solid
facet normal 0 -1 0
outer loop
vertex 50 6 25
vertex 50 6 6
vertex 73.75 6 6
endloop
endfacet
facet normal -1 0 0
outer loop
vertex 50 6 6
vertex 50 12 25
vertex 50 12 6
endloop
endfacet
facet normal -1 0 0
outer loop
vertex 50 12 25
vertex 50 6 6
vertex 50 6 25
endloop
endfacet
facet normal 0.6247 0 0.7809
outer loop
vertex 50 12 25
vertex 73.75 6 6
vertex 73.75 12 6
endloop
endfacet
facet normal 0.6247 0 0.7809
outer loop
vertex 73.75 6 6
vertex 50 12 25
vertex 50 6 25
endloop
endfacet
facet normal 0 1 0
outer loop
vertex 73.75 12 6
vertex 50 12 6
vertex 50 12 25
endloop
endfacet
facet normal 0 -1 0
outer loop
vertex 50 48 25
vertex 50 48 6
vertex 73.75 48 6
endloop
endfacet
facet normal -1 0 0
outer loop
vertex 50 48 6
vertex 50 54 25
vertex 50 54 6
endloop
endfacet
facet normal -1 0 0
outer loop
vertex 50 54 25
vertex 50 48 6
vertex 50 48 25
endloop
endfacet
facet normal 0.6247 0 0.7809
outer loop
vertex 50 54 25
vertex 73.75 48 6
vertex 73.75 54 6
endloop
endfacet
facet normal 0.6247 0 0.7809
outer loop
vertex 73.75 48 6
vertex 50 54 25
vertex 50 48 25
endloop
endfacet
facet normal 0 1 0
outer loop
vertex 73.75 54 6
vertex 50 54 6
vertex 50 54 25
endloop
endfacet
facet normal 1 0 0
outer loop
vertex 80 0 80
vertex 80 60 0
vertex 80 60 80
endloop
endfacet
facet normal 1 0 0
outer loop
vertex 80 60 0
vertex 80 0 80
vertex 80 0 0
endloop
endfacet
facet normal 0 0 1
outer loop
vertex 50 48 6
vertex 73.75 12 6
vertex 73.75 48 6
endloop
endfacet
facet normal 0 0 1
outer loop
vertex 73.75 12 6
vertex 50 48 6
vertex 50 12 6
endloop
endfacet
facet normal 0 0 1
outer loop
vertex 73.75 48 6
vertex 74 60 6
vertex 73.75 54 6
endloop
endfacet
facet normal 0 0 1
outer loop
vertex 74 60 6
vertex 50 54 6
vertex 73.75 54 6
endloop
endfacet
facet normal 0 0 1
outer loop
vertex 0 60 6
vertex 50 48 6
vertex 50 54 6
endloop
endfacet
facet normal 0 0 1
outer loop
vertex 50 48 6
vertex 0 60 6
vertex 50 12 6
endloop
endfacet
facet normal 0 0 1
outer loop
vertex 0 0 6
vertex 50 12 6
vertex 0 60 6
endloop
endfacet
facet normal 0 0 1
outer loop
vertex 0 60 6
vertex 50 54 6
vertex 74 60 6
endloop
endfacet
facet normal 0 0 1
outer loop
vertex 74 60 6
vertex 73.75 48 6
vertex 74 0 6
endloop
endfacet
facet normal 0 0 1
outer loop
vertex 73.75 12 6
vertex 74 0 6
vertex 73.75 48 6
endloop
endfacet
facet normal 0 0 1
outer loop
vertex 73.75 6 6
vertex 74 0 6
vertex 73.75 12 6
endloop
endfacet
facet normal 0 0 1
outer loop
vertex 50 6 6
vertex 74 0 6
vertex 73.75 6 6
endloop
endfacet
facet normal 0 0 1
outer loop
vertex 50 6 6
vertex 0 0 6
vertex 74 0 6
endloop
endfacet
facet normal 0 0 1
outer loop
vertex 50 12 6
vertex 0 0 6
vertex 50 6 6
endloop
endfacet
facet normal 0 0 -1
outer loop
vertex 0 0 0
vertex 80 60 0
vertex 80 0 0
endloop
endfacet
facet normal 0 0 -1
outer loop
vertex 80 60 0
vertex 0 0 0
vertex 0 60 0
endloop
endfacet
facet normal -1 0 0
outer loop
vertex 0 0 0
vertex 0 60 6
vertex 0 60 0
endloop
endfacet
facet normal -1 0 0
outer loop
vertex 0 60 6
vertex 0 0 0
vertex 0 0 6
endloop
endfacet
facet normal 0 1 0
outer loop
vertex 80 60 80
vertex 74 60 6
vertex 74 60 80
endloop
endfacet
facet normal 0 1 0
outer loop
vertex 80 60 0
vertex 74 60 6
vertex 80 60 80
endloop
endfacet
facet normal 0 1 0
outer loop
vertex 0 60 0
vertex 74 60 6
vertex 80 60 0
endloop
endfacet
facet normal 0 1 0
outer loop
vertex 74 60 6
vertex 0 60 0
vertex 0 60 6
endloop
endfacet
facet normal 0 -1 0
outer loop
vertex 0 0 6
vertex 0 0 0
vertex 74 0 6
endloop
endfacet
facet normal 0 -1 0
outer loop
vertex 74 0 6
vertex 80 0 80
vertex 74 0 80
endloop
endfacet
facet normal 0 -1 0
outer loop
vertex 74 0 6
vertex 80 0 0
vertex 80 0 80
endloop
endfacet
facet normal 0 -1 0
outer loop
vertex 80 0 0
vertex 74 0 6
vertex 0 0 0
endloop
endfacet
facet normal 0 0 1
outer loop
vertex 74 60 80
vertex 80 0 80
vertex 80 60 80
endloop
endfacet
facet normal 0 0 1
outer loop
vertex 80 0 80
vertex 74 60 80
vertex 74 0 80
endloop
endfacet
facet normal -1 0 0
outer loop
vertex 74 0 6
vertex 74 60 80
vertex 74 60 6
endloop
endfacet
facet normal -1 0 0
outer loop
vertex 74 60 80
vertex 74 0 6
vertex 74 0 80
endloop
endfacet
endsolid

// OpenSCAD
$fn = 32;

// ----------------------------------------------------------------------
// Rib bracket: 2-gusset L bracket
// ----------------------------------------------------------------------

// --- parameters (mm) ---
base_l = 80;              // foot length, X
base_w = 60;              // foot width, Y
base_t = 6;               // foot thickness
plate_t = 6;              // upright plate thickness
plate_h = 80;             // overall height
gus_l = 24;               // gusset leg along the foot
gus_h = 20;               // gusset height
gus_t = 6;                // gusset thickness
gus_edge = 6;             // gusset margin from the foot edge
n_gus = 2;                // gusset count
fit_tol = 0.05;           // tolerance for press fits, mm
free_tol = 0.2;           // tolerance for clearance fits, mm

gus_pitch = (base_w - 2 * gus_edge - gus_t) / (n_gus - 1);  // gusset pitch

union() {
  cube([base_l, base_w, base_t]);
  translate([base_l - plate_t, 0, base_t - 1])
    cube([plate_t, base_w, plate_h - base_t + 1]);
  for (i = [0 : n_gus - 1])
    translate([base_l - plate_t - gus_l, gus_edge + i * gus_pitch, base_t - 1])
      rotate([-90, 0, 0])
        linear_extrude(height = gus_t)
          polygon(points = [[0, 0], [gus_l + 1, 0], [0, -gus_h]]);
}
